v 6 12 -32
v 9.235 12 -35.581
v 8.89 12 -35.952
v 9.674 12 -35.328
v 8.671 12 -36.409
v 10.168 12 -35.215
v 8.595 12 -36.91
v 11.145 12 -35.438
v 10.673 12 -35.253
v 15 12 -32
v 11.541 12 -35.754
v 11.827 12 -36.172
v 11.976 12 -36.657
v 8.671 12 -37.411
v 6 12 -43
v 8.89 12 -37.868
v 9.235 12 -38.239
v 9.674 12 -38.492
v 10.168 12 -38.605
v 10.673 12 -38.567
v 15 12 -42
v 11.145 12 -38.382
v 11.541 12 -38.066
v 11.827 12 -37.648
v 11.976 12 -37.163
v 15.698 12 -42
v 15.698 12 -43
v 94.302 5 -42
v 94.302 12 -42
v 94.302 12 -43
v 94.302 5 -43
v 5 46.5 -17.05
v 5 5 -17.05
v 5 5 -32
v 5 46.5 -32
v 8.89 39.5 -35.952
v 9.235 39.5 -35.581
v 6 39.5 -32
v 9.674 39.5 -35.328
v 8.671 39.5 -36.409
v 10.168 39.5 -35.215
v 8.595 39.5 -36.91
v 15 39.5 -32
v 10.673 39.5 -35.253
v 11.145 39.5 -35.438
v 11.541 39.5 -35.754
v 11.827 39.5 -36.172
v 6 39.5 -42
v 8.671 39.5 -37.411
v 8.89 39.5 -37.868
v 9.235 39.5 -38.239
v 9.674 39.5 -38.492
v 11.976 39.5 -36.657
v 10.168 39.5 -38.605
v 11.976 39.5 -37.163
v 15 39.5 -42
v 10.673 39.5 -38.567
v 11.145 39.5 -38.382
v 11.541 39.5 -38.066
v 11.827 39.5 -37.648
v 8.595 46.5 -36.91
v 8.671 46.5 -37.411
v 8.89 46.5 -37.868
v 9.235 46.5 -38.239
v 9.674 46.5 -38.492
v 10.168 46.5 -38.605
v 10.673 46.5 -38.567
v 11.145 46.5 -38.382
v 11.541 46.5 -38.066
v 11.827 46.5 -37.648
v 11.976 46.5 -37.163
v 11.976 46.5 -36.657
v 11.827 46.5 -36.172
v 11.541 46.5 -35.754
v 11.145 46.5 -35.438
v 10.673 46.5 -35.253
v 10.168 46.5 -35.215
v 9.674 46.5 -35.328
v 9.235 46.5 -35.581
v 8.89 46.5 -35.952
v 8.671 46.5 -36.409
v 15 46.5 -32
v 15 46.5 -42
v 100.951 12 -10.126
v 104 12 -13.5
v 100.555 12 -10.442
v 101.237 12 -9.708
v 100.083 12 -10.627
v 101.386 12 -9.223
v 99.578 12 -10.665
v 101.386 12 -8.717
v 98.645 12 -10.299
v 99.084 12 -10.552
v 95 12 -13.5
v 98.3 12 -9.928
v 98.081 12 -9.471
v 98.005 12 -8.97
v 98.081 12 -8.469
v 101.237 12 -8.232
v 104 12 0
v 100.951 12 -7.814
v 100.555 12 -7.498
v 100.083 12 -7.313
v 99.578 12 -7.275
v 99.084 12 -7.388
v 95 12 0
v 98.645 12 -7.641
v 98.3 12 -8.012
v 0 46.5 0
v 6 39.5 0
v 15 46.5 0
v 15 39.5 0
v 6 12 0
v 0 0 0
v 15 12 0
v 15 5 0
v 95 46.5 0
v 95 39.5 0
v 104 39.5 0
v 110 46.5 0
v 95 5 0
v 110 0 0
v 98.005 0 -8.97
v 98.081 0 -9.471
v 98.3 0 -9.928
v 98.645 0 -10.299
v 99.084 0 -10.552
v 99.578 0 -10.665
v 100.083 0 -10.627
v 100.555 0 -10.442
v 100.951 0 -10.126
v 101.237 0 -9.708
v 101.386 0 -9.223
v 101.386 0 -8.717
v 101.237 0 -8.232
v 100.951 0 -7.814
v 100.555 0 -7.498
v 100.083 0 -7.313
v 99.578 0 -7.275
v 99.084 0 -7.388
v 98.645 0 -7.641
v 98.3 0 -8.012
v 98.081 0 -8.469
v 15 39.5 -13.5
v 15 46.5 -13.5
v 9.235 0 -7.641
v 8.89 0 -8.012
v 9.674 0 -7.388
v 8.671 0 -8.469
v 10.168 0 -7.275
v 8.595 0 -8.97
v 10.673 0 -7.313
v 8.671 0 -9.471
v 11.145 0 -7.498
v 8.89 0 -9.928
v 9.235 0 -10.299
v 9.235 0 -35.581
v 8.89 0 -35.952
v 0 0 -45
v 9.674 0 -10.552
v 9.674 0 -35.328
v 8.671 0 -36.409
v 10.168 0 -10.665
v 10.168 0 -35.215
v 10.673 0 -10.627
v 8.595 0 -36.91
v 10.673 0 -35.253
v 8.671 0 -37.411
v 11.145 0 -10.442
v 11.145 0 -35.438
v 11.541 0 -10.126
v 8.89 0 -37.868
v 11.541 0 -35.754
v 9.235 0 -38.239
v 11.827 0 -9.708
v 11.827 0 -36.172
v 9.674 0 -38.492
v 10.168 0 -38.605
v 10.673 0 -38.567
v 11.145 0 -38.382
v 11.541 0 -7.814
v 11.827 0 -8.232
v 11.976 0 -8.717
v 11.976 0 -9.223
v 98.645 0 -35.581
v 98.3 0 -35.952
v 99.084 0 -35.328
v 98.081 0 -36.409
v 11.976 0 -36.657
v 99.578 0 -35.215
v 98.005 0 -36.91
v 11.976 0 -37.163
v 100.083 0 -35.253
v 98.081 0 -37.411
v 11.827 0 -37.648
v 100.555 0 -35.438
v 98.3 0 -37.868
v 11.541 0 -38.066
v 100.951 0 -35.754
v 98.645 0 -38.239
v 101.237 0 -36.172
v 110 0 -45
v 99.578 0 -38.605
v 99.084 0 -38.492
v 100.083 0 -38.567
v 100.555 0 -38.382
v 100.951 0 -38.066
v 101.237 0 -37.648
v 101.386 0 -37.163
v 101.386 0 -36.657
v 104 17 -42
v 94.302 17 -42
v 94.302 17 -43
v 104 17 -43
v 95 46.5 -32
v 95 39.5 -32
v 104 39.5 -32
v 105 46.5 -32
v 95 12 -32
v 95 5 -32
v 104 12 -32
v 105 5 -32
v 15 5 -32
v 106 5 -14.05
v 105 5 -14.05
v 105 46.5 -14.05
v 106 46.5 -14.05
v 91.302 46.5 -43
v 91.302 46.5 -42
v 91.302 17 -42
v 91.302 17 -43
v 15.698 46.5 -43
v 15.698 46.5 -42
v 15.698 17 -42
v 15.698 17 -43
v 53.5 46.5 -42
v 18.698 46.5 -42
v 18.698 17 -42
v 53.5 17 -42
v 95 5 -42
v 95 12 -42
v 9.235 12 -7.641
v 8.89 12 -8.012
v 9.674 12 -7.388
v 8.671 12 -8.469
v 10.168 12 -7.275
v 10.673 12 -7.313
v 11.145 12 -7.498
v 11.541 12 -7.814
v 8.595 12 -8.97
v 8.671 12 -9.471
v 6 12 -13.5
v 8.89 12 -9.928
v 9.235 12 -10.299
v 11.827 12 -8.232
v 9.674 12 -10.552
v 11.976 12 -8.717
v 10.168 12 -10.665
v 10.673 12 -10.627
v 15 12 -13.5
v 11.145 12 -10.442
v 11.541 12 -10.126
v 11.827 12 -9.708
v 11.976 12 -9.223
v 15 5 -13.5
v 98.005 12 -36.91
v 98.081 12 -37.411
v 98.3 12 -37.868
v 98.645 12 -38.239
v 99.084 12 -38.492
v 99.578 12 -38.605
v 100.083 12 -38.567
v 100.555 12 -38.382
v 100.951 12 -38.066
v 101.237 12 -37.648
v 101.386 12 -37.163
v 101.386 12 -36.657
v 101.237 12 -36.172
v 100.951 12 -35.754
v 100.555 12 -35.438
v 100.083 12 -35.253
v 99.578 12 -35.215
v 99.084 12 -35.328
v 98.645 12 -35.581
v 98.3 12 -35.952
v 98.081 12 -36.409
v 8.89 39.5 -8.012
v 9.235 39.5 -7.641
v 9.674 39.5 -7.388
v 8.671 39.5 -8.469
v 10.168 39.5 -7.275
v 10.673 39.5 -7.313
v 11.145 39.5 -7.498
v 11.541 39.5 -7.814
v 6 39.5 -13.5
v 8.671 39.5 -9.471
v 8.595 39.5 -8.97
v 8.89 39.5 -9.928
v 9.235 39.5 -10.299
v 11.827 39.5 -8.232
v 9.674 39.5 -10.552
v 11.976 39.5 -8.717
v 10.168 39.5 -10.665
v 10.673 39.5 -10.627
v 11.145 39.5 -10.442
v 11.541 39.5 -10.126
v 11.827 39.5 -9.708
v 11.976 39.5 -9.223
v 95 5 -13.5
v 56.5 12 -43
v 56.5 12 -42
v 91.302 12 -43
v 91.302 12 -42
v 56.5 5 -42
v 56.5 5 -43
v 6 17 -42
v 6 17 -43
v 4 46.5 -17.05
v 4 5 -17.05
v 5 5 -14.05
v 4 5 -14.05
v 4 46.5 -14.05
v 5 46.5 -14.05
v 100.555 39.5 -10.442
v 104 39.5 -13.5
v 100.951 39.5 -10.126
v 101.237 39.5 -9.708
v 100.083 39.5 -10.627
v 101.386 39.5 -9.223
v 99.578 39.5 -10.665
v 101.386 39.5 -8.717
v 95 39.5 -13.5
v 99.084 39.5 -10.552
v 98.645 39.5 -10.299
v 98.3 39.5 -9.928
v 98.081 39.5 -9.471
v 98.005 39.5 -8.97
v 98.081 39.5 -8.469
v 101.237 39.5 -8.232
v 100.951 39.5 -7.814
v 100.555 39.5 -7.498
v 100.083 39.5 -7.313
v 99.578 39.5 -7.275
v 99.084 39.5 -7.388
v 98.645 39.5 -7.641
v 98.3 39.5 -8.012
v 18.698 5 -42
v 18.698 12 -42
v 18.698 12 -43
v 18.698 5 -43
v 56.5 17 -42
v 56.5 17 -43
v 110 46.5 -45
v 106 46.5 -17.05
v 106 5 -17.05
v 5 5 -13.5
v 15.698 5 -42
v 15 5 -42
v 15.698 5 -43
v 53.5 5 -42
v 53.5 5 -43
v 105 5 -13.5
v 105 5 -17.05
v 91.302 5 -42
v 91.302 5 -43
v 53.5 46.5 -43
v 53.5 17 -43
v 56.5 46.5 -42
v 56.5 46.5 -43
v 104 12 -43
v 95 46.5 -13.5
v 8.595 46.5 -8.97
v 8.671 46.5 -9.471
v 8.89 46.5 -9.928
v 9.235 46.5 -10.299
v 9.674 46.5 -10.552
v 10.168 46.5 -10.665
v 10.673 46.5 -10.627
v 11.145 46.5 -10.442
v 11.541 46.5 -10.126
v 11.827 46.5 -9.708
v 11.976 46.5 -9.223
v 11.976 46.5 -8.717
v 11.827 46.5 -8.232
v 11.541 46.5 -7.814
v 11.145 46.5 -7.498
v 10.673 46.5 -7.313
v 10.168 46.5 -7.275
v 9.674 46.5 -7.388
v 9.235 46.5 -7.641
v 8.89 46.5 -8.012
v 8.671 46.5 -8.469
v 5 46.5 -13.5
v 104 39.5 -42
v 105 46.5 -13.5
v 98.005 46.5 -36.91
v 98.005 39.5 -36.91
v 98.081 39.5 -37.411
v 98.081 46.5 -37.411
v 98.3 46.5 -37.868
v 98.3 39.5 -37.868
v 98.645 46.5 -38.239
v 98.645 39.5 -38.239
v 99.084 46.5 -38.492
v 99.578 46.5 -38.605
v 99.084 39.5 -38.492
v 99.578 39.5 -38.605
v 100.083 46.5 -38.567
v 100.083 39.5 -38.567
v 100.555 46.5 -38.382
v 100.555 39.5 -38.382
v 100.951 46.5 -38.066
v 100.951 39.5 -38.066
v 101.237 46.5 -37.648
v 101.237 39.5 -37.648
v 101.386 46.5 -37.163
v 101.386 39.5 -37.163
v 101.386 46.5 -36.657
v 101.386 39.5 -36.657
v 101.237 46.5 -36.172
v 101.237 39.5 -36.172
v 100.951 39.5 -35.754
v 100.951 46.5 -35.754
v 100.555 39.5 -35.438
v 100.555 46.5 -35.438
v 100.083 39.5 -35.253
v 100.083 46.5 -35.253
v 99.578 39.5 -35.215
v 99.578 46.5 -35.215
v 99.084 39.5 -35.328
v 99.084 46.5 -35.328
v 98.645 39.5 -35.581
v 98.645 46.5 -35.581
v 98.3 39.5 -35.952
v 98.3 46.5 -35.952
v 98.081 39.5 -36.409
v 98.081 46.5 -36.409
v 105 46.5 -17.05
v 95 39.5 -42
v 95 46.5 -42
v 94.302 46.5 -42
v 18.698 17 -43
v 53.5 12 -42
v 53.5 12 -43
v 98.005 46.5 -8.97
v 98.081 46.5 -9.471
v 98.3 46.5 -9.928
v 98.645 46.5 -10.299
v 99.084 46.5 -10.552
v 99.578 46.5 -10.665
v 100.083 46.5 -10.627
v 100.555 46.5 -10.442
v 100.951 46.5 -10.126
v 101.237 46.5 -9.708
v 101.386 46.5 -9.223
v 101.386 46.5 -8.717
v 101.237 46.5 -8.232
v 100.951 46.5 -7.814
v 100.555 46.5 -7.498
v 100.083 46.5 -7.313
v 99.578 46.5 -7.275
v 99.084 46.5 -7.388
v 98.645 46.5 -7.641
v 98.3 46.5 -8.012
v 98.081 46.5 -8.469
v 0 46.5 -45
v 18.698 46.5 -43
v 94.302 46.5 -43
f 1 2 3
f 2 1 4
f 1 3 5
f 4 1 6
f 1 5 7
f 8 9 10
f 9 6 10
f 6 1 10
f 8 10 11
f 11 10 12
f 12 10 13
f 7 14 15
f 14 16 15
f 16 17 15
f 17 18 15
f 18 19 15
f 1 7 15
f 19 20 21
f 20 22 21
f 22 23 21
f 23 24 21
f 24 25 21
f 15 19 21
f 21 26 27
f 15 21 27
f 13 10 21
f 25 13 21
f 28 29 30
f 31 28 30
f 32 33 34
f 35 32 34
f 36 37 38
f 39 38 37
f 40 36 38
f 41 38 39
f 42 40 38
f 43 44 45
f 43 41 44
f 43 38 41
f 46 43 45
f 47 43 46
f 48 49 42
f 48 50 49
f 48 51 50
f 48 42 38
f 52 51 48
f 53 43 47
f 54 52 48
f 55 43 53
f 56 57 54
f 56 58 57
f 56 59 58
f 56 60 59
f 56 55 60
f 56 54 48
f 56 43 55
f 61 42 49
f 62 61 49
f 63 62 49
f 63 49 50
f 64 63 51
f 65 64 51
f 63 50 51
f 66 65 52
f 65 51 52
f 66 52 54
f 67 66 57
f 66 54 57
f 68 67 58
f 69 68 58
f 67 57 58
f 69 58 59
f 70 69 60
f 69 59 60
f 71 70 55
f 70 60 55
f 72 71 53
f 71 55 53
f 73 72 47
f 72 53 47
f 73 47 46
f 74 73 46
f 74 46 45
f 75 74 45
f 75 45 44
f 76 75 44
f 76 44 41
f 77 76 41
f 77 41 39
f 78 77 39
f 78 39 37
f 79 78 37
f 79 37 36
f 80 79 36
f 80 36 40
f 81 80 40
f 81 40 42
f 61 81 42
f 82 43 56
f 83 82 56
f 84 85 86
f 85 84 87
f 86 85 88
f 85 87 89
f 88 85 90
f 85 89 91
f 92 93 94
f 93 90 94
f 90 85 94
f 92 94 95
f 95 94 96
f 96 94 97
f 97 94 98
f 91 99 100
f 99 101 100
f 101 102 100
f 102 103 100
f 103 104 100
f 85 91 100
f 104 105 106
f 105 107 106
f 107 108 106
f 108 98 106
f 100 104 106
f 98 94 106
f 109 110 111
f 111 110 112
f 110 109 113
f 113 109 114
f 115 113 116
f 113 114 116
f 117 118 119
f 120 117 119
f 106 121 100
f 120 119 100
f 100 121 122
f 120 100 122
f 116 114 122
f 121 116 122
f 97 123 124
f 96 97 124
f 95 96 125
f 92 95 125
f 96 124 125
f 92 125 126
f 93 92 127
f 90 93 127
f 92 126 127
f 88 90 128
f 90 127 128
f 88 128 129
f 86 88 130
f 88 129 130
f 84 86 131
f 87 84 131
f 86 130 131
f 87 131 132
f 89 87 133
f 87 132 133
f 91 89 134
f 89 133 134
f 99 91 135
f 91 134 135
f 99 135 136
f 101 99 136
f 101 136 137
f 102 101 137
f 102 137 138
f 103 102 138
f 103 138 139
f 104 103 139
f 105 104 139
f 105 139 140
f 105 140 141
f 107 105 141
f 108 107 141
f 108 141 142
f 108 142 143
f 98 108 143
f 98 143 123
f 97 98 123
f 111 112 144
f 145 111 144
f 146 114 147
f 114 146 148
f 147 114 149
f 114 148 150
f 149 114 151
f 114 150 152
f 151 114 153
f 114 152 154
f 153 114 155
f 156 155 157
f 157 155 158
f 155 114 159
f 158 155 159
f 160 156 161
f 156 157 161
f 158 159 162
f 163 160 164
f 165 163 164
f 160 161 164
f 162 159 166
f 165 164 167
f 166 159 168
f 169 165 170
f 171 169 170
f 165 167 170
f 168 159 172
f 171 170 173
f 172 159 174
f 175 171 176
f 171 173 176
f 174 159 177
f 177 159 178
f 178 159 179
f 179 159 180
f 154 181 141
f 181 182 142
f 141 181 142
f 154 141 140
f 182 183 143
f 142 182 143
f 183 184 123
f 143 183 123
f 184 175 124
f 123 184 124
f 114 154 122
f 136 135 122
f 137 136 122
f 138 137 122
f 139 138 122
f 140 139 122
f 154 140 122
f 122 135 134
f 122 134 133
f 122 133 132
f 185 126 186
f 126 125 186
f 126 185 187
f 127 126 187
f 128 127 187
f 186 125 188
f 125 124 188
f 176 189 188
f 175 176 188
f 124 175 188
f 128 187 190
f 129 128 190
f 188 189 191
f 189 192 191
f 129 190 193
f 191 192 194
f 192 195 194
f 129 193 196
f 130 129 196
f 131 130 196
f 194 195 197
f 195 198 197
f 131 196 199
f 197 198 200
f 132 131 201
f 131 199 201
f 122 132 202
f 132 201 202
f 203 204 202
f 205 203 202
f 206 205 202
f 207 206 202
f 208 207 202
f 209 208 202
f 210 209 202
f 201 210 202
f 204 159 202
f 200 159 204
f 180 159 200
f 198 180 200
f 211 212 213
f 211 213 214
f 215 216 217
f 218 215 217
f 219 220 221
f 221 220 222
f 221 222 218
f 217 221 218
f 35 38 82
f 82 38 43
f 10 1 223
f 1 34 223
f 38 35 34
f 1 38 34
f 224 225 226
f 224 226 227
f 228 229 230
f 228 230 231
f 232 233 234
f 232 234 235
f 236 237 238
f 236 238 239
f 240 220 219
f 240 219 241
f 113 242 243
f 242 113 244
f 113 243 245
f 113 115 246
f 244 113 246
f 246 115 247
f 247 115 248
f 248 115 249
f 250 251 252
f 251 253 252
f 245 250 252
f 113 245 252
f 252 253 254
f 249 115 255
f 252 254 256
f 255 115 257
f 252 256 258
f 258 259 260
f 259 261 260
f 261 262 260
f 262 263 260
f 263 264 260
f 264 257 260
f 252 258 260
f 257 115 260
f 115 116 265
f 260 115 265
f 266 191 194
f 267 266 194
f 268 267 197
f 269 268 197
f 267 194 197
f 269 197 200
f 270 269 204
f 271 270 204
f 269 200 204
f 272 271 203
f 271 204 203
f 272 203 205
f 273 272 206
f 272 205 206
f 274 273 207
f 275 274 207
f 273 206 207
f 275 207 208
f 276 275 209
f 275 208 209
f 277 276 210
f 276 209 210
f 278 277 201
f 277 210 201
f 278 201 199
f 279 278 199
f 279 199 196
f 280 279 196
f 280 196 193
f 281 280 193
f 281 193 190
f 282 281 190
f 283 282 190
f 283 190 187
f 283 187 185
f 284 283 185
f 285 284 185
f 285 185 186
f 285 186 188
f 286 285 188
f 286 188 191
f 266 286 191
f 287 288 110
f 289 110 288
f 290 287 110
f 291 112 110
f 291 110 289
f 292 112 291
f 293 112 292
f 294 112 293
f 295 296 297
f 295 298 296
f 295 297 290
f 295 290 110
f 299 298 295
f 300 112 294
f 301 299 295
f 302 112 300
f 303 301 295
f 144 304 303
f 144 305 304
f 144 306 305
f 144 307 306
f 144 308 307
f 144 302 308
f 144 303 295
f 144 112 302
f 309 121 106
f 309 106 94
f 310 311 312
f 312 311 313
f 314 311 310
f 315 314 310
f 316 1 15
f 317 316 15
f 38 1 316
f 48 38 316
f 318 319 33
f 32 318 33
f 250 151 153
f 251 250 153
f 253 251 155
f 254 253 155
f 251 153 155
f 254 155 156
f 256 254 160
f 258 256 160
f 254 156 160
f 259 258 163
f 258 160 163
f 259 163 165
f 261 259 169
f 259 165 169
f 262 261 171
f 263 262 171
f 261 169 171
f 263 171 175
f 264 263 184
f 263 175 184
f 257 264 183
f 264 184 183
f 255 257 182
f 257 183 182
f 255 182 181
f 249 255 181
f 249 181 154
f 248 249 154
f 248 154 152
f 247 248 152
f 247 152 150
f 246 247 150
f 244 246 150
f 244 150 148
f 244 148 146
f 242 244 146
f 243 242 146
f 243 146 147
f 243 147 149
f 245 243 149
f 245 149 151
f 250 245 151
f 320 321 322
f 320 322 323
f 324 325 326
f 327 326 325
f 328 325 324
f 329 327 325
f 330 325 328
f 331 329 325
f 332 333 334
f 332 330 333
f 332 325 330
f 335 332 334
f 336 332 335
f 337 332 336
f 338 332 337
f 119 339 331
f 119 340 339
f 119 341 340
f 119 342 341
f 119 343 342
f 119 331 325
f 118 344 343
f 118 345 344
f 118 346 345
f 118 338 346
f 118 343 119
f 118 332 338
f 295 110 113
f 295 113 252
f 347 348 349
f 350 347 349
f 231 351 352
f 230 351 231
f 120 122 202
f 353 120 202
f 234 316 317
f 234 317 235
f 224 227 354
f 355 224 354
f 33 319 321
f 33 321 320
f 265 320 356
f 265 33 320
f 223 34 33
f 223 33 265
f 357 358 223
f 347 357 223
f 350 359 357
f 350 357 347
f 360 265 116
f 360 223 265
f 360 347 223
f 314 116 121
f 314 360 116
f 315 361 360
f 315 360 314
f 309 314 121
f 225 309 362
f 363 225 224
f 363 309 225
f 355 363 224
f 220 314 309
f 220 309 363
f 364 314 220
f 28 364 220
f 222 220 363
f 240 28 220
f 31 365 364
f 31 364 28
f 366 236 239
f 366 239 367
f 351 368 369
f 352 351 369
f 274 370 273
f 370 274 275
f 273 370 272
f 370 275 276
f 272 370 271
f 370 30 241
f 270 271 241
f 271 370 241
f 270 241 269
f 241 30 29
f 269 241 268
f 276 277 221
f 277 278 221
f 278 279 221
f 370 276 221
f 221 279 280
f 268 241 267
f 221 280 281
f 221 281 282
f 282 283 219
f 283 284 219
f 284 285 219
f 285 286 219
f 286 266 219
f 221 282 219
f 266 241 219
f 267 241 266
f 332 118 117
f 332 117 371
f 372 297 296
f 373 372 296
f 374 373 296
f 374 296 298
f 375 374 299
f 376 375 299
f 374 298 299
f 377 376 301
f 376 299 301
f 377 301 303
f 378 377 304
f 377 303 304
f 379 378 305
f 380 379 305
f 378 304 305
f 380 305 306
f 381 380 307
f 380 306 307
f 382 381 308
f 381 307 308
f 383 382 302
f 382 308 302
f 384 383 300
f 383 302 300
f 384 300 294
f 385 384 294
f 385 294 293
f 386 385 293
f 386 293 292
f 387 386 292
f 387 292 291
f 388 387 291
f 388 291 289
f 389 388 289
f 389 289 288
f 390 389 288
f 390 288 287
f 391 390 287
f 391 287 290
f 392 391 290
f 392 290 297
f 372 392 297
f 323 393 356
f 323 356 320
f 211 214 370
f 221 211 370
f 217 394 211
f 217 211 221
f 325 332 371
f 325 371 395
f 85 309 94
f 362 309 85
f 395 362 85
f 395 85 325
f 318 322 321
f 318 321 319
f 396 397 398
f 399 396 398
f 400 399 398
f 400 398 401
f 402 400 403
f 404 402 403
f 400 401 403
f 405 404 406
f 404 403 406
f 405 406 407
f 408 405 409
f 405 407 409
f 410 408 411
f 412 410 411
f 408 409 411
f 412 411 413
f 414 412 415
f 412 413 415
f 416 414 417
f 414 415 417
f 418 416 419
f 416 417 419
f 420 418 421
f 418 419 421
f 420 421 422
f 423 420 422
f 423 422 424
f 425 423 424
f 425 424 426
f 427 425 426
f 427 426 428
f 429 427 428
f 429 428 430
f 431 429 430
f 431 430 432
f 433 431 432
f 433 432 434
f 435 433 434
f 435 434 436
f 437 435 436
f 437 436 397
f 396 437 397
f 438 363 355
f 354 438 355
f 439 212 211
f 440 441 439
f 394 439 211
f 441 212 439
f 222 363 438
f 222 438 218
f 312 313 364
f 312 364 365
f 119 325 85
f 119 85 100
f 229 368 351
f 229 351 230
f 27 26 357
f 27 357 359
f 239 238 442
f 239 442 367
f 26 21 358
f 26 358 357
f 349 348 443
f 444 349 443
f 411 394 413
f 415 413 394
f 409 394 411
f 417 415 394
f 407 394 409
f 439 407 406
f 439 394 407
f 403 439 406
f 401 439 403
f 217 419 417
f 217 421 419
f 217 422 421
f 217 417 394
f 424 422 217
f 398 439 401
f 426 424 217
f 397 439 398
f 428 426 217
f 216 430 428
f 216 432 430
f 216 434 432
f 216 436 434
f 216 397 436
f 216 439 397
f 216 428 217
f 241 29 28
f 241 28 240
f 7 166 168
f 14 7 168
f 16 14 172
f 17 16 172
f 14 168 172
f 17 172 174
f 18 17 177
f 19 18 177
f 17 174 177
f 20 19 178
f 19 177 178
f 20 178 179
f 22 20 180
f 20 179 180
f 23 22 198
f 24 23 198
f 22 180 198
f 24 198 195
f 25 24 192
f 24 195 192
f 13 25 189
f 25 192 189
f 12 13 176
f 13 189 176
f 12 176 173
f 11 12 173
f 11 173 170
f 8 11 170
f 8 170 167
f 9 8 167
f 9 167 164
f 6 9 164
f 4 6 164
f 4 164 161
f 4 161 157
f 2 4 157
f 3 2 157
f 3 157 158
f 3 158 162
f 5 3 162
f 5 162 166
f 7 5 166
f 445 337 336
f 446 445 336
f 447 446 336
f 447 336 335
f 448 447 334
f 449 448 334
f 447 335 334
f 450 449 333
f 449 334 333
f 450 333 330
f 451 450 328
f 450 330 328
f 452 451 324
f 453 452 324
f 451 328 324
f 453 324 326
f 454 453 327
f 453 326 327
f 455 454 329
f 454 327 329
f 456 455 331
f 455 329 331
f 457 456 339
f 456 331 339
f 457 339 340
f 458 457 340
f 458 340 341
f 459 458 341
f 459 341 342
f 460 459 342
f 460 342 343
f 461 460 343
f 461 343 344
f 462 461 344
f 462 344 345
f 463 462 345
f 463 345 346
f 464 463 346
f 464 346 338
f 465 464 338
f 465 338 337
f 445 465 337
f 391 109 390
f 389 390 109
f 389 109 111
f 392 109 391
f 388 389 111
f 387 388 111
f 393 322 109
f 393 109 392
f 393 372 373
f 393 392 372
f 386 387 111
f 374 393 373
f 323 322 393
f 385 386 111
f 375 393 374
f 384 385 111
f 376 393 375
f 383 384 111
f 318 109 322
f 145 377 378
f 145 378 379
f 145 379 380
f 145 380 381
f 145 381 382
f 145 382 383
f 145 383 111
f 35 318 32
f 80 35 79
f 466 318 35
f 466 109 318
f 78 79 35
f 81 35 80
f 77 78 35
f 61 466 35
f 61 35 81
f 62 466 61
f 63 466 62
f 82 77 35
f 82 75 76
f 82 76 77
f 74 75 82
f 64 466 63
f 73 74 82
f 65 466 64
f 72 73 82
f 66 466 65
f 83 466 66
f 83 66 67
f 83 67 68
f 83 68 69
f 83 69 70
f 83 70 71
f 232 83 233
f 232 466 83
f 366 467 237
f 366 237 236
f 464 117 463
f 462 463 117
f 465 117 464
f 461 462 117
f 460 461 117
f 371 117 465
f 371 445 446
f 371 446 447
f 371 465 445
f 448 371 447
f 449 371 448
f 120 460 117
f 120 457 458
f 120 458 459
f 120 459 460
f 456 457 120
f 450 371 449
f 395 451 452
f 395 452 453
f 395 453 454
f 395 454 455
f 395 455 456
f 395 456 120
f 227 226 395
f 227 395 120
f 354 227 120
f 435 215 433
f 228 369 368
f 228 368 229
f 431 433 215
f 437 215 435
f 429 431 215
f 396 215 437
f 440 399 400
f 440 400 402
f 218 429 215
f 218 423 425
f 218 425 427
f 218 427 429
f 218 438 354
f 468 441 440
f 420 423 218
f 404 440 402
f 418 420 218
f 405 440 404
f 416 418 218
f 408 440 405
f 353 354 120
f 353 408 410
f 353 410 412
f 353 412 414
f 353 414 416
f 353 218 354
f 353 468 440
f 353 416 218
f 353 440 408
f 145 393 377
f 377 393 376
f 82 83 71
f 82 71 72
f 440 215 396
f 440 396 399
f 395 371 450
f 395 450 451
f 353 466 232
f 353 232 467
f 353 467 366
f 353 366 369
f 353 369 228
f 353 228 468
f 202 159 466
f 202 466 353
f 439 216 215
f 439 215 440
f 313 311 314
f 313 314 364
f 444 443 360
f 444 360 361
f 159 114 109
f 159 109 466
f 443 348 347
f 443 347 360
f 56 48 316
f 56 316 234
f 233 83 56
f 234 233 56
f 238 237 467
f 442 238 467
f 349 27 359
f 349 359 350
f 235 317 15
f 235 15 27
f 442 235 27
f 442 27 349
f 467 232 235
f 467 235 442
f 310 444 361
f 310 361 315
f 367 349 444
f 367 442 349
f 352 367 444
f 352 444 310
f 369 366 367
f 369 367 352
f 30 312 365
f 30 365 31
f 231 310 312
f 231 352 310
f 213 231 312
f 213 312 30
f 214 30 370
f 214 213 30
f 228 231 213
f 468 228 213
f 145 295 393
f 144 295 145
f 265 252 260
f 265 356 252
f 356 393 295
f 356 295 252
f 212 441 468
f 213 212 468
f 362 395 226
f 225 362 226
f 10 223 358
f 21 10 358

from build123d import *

# Parameters (mm, degrees)
SKETCH1_W            = 110
SKETCH1_H            = 45
BOSS_EXTRUDE1_DEPTH  = 46.5
SKETCH2_W            = 100
SKETCH2_H            = 42
CUT_EXTRUDE1_DEPTH   = 41.5
SKETCH24_W           = 3
SKETCH24_H           = 1
CUT_EXTRUDE10_DEPTH  = 41.5
SKETCH26_W           = 10
SKETCH26_H           = 10
SKETCH26_H_2         = 13.5
BOSS_EXTRUDE2_DEPTH  = 41.5
M3_CLEARANCE_HOLE5_D = 3.4
SKETCH29_W           = 10
SKETCH29_H           = 27.5
SKETCH29_W_2         = 13.5
CUT_EXTRUDE11_DEPTH  = 9
SKETCH30_W           = 10
SKETCH30_H           = 27.5
SKETCH30_W_2         = 13.5
CUT_EXTRUDE12_DEPTH  = 9
SKETCH32_W           = 3
SKETCH32_H           = 1
CUT_EXTRUDE14_DEPTH  = 41.5
SKETCH33_W           = 1
SKETCH33_H           = 3
CUT_EXTRUDE15_DEPTH  = 41.5
SKETCH34_W           = 98
SKETCH34_H           = 5
CUT_EXTRUDE16_DEPTH  = 1


with BuildPart() as part:
    # Sketch1 → Boss-Extrude1 (new body)
    with BuildSketch(Plane(origin=(0, 0, 0), x_dir=(1, 0, 0), z_dir=(0, 1, 0))):
        with Locations((55, 22.5)):
            Rectangle(SKETCH1_W, SKETCH1_H)
    extrude(amount=BOSS_EXTRUDE1_DEPTH)

    # Sketch2 → Cut-Extrude1 (cut)
    with BuildSketch(Plane(origin=(0, 46.5, 0), x_dir=(1, 0, 0), z_dir=(0, 1, 0))):
        with Locations((55, 21)):
            Rectangle(SKETCH2_W, SKETCH2_H)
    extrude(amount=-CUT_EXTRUDE1_DEPTH, mode=Mode.SUBTRACT)

    # Sketch24 → Cut-Extrude10 (cut)
    with BuildSketch(Plane(origin=(0, 46.5, 0), x_dir=(1, 0, 0), z_dir=(0, 1, 0))):
        with Locations((55, 42.5)):
            Rectangle(SKETCH24_W, SKETCH24_H)
    extrude(amount=-CUT_EXTRUDE10_DEPTH, mode=Mode.SUBTRACT)

    # Sketch26 → Boss-Extrude2 (add)
    with BuildSketch(Plane(origin=(0, 5, 0), x_dir=(1, 0, 0), z_dir=(0, 1, 0))):
        with Locations((10, 37)):
            Rectangle(SKETCH26_W, SKETCH26_H)
        with Locations((10, 6.75)):
            Rectangle(SKETCH26_W, SKETCH26_H_2)
        with Locations((100, 37)):
            Rectangle(SKETCH26_W, SKETCH26_H)
        with Locations((100, 6.75)):
            Rectangle(SKETCH26_W, SKETCH26_H_2)
    extrude(amount=BOSS_EXTRUDE2_DEPTH)

    # M3 Clearance Hole5 (through all)
    with Locations(Plane(origin=(0, 46.5, 0), x_dir=(1, 0, 0), z_dir=(0, 1, 0))):
        with Locations((10.295, 36.91), (99.705, 36.91), (99.705, 8.97), (10.295, 8.97)):
            Hole(M3_CLEARANCE_HOLE5_D / 2)

    # Sketch29 → Cut-Extrude11 (cut)
    with BuildSketch(Plane(origin=(15, 0, 0), x_dir=(0, 0, -1), z_dir=(1, 0, 0))):
        with Locations((37, 25.75)):
            Rectangle(SKETCH29_W, SKETCH29_H)
        with Locations((6.75, 25.75)):
            Rectangle(SKETCH29_W_2, SKETCH29_H)
    extrude(amount=-CUT_EXTRUDE11_DEPTH, mode=Mode.SUBTRACT)

    # Sketch30 → Cut-Extrude12 (cut)
    with BuildSketch(Plane.ZY.offset(-95)):
        with Locations((-37, 25.75)):
            Rectangle(SKETCH30_W, SKETCH30_H)
        with Locations((-6.75, 25.75)):
            Rectangle(SKETCH30_W_2, SKETCH30_H)
    extrude(amount=-CUT_EXTRUDE12_DEPTH, mode=Mode.SUBTRACT)

    # Sketch32 → Cut-Extrude14 (cut)
    with BuildSketch(Plane(origin=(0, 46.5, 0), x_dir=(1, 0, 0), z_dir=(0, 1, 0))):
        with Locations((17.198, 42.5)):
            Rectangle(SKETCH32_W, SKETCH32_H)
        with Locations((92.802, 42.5)):
            Rectangle(SKETCH32_W, SKETCH32_H)
    extrude(amount=-CUT_EXTRUDE14_DEPTH, mode=Mode.SUBTRACT)

    # Sketch33 → Cut-Extrude15 (cut)
    with BuildSketch(Plane(origin=(0, 46.5, 0), x_dir=(1, 0, 0), z_dir=(0, 1, 0))):
        with Locations((4.5, 15.55)):
            Rectangle(SKETCH33_W, SKETCH33_H)
        with Locations((105.5, 15.55)):
            Rectangle(SKETCH33_W, SKETCH33_H)
    extrude(amount=-CUT_EXTRUDE15_DEPTH, mode=Mode.SUBTRACT)

    # Sketch34 → Cut-Extrude16 (cut)
    with BuildSketch(Plane.XY.offset(-42)):
        with Locations((55, 14.5)):
            Rectangle(SKETCH34_W, SKETCH34_H)
    extrude(amount=-CUT_EXTRUDE16_DEPTH, mode=Mode.SUBTRACT)


solid = part.part
